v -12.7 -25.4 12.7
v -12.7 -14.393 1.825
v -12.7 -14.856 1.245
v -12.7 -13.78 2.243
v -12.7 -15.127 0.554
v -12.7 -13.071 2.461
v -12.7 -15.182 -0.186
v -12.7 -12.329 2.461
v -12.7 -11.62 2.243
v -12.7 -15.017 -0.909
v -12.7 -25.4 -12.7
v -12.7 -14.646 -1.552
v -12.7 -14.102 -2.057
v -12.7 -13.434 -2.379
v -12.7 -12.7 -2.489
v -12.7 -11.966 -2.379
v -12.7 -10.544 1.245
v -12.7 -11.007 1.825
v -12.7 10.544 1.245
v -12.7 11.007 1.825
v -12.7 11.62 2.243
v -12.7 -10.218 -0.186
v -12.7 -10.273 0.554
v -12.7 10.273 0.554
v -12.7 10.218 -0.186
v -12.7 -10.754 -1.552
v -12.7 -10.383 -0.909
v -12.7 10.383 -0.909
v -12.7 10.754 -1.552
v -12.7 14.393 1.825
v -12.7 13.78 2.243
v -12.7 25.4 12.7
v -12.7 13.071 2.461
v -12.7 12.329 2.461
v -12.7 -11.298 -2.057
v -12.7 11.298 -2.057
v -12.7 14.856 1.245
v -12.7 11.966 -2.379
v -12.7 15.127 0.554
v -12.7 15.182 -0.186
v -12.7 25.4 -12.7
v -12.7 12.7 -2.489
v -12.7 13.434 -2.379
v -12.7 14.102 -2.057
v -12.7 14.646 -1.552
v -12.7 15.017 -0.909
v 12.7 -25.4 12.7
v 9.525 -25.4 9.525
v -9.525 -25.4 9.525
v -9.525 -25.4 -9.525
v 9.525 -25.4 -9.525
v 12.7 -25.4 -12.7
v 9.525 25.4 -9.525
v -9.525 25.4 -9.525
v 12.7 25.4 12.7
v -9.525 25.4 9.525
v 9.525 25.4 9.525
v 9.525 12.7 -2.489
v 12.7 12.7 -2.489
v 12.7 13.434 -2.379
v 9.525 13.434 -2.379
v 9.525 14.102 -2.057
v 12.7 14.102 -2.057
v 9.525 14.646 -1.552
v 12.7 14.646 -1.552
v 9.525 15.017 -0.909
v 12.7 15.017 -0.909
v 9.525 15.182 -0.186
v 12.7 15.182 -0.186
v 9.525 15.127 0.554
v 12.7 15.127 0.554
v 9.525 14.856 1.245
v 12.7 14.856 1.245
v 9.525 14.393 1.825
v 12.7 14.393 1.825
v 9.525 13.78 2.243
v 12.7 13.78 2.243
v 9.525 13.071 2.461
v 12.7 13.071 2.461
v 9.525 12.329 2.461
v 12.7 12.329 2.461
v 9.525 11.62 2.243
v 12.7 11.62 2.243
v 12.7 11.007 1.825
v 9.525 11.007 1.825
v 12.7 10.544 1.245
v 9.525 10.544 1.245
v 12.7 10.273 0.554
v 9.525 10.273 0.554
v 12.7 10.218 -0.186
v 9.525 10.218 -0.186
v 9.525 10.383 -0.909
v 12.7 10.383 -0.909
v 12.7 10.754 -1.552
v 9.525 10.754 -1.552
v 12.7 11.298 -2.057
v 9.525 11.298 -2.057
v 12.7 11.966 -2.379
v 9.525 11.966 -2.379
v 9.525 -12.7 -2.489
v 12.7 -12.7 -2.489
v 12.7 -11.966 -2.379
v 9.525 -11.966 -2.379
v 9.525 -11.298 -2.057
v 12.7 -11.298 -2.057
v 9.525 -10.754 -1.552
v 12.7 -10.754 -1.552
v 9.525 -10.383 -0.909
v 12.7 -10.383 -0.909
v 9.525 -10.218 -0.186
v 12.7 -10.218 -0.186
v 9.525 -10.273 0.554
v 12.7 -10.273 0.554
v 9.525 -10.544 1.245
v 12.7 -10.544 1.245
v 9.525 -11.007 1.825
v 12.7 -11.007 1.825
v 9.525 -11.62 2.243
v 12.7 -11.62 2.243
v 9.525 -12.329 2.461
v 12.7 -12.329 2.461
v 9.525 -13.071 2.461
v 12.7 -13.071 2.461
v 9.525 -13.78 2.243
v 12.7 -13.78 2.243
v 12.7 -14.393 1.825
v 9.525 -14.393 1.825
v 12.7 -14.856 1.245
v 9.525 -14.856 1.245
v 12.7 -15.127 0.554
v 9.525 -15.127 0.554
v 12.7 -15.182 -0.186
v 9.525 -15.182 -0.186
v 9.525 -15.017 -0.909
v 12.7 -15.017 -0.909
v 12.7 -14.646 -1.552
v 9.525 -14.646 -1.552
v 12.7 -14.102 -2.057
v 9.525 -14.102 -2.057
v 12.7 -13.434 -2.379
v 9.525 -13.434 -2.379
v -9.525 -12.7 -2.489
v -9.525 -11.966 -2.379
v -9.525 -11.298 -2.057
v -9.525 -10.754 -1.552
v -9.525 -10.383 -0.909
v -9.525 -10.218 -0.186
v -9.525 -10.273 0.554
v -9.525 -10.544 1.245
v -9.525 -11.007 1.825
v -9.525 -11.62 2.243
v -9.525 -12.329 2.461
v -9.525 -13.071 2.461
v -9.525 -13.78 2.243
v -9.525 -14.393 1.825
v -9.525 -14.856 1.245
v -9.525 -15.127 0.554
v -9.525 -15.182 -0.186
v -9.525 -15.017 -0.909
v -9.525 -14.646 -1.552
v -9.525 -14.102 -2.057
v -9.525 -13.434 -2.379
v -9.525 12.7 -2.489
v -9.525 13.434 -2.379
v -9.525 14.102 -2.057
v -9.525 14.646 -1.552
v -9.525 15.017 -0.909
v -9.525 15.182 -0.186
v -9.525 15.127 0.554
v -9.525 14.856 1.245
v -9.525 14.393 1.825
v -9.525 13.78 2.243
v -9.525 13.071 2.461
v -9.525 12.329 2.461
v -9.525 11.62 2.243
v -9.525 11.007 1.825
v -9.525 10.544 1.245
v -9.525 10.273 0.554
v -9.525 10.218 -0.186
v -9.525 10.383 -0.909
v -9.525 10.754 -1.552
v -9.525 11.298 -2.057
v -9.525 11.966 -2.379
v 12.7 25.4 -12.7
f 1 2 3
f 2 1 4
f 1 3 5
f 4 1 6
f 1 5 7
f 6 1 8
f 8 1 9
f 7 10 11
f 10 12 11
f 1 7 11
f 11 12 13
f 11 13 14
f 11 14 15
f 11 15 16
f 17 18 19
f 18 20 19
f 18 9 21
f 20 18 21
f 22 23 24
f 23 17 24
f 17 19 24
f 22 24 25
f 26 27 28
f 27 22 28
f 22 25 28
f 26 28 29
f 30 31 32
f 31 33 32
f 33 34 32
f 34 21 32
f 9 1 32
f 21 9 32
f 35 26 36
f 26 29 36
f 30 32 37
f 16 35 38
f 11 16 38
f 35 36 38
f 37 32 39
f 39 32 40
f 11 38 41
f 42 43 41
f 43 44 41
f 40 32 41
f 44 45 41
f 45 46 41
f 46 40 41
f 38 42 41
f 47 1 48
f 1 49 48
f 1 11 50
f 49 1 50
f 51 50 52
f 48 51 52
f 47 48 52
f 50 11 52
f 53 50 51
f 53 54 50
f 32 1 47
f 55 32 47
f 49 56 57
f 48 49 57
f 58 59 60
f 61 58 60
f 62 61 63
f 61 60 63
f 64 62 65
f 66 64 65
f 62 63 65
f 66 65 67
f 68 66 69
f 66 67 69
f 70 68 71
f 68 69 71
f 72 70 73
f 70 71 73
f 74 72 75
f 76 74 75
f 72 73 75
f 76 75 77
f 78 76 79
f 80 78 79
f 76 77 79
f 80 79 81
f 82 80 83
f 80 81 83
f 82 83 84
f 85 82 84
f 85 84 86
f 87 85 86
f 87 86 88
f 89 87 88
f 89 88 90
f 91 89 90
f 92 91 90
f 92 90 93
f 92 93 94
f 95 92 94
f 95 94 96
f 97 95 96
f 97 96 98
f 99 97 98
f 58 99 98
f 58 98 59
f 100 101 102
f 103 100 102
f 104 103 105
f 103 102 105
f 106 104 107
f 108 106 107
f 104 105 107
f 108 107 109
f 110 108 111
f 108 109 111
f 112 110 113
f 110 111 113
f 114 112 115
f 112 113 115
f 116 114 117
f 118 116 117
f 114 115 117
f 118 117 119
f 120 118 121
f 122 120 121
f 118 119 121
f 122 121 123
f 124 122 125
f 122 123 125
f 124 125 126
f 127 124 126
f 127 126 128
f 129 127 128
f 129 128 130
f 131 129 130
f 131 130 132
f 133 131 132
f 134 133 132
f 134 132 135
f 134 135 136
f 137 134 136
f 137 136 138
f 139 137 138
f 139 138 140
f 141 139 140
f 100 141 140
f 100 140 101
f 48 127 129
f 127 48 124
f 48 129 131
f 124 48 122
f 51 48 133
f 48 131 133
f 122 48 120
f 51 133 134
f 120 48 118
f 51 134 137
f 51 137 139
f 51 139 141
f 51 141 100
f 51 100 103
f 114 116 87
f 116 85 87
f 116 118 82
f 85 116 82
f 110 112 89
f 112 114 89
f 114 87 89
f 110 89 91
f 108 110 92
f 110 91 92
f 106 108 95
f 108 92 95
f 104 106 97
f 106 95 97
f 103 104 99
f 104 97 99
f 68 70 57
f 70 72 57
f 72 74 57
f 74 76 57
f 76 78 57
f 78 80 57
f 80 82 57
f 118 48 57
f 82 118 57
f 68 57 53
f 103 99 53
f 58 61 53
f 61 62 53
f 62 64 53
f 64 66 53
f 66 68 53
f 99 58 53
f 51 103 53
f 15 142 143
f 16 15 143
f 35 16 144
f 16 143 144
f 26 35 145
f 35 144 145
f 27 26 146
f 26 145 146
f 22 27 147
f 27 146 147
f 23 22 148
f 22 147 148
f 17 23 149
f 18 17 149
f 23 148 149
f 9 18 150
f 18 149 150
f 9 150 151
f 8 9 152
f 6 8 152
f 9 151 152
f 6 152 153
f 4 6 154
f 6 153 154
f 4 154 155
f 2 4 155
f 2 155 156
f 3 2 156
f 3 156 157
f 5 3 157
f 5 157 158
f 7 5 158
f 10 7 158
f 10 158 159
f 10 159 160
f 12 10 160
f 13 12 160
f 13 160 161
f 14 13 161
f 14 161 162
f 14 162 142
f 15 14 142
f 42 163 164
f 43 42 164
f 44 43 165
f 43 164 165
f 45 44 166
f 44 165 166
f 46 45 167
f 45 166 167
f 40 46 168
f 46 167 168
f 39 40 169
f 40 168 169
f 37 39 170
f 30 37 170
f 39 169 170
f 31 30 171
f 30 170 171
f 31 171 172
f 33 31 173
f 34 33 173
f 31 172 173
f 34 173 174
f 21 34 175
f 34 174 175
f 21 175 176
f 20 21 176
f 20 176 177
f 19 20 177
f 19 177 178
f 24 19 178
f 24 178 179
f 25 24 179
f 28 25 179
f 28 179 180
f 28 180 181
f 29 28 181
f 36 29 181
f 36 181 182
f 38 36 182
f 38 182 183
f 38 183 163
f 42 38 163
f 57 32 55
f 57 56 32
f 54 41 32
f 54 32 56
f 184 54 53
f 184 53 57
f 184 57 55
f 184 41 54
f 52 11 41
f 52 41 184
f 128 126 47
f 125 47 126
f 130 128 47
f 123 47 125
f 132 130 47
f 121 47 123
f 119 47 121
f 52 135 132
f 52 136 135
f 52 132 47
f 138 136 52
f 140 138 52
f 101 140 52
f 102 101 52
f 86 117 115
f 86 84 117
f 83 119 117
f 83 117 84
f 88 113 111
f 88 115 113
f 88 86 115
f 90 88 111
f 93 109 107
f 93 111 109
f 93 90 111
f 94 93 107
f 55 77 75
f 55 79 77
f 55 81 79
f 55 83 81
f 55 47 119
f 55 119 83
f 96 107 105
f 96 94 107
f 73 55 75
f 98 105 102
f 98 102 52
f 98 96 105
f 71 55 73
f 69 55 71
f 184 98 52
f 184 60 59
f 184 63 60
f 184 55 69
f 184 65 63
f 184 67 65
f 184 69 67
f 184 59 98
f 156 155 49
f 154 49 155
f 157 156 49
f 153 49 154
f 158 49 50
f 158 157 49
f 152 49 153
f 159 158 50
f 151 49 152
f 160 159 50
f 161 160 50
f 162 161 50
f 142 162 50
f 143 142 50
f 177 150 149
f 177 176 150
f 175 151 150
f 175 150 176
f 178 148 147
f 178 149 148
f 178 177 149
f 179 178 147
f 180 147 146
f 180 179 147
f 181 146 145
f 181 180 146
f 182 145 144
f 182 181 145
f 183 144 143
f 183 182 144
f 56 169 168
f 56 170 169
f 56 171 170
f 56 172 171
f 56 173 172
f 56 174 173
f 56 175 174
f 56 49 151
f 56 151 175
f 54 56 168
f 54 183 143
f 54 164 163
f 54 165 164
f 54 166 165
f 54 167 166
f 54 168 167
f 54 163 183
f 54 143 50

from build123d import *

# Parameters (mm, degrees)
SKETCH1_W           = 25.4
SKETCH1_H           = 25.4
SKETCH1_W_2         = 19.05
SKETCH1_H_2         = 19.05
EXTRUDE_THIN1_DEPTH = 25.4
SKETCH2_R           = 2.4892
CUT_EXTRUDE1_DEPTH  = 26.4


with BuildPart() as part:
    # Sketch1 → Extrude-Thin1 (new body, symmetric)
    with BuildSketch(Plane(origin=(0, 0, 0), x_dir=(1, 0, 0), z_dir=(0, 1, 0))):
        Rectangle(SKETCH1_W, SKETCH1_H)
        Rectangle(SKETCH1_W_2, SKETCH1_H_2, mode=Mode.SUBTRACT)
    extrude(amount=EXTRUDE_THIN1_DEPTH, both=True)

    # Sketch2 → Cut-Extrude1 (cut, through all)
    with BuildSketch(Plane(origin=(12.7, 0, 0), x_dir=(0, 0, -1), z_dir=(1, 0, 0))):
        with Locations((0, 12.7)):
            Circle(SKETCH2_R)
        with Locations((0, -12.7)):
            Circle(SKETCH2_R)
    extrude(amount=-CUT_EXTRUDE1_DEPTH, mode=Mode.SUBTRACT)


solid = part.part
